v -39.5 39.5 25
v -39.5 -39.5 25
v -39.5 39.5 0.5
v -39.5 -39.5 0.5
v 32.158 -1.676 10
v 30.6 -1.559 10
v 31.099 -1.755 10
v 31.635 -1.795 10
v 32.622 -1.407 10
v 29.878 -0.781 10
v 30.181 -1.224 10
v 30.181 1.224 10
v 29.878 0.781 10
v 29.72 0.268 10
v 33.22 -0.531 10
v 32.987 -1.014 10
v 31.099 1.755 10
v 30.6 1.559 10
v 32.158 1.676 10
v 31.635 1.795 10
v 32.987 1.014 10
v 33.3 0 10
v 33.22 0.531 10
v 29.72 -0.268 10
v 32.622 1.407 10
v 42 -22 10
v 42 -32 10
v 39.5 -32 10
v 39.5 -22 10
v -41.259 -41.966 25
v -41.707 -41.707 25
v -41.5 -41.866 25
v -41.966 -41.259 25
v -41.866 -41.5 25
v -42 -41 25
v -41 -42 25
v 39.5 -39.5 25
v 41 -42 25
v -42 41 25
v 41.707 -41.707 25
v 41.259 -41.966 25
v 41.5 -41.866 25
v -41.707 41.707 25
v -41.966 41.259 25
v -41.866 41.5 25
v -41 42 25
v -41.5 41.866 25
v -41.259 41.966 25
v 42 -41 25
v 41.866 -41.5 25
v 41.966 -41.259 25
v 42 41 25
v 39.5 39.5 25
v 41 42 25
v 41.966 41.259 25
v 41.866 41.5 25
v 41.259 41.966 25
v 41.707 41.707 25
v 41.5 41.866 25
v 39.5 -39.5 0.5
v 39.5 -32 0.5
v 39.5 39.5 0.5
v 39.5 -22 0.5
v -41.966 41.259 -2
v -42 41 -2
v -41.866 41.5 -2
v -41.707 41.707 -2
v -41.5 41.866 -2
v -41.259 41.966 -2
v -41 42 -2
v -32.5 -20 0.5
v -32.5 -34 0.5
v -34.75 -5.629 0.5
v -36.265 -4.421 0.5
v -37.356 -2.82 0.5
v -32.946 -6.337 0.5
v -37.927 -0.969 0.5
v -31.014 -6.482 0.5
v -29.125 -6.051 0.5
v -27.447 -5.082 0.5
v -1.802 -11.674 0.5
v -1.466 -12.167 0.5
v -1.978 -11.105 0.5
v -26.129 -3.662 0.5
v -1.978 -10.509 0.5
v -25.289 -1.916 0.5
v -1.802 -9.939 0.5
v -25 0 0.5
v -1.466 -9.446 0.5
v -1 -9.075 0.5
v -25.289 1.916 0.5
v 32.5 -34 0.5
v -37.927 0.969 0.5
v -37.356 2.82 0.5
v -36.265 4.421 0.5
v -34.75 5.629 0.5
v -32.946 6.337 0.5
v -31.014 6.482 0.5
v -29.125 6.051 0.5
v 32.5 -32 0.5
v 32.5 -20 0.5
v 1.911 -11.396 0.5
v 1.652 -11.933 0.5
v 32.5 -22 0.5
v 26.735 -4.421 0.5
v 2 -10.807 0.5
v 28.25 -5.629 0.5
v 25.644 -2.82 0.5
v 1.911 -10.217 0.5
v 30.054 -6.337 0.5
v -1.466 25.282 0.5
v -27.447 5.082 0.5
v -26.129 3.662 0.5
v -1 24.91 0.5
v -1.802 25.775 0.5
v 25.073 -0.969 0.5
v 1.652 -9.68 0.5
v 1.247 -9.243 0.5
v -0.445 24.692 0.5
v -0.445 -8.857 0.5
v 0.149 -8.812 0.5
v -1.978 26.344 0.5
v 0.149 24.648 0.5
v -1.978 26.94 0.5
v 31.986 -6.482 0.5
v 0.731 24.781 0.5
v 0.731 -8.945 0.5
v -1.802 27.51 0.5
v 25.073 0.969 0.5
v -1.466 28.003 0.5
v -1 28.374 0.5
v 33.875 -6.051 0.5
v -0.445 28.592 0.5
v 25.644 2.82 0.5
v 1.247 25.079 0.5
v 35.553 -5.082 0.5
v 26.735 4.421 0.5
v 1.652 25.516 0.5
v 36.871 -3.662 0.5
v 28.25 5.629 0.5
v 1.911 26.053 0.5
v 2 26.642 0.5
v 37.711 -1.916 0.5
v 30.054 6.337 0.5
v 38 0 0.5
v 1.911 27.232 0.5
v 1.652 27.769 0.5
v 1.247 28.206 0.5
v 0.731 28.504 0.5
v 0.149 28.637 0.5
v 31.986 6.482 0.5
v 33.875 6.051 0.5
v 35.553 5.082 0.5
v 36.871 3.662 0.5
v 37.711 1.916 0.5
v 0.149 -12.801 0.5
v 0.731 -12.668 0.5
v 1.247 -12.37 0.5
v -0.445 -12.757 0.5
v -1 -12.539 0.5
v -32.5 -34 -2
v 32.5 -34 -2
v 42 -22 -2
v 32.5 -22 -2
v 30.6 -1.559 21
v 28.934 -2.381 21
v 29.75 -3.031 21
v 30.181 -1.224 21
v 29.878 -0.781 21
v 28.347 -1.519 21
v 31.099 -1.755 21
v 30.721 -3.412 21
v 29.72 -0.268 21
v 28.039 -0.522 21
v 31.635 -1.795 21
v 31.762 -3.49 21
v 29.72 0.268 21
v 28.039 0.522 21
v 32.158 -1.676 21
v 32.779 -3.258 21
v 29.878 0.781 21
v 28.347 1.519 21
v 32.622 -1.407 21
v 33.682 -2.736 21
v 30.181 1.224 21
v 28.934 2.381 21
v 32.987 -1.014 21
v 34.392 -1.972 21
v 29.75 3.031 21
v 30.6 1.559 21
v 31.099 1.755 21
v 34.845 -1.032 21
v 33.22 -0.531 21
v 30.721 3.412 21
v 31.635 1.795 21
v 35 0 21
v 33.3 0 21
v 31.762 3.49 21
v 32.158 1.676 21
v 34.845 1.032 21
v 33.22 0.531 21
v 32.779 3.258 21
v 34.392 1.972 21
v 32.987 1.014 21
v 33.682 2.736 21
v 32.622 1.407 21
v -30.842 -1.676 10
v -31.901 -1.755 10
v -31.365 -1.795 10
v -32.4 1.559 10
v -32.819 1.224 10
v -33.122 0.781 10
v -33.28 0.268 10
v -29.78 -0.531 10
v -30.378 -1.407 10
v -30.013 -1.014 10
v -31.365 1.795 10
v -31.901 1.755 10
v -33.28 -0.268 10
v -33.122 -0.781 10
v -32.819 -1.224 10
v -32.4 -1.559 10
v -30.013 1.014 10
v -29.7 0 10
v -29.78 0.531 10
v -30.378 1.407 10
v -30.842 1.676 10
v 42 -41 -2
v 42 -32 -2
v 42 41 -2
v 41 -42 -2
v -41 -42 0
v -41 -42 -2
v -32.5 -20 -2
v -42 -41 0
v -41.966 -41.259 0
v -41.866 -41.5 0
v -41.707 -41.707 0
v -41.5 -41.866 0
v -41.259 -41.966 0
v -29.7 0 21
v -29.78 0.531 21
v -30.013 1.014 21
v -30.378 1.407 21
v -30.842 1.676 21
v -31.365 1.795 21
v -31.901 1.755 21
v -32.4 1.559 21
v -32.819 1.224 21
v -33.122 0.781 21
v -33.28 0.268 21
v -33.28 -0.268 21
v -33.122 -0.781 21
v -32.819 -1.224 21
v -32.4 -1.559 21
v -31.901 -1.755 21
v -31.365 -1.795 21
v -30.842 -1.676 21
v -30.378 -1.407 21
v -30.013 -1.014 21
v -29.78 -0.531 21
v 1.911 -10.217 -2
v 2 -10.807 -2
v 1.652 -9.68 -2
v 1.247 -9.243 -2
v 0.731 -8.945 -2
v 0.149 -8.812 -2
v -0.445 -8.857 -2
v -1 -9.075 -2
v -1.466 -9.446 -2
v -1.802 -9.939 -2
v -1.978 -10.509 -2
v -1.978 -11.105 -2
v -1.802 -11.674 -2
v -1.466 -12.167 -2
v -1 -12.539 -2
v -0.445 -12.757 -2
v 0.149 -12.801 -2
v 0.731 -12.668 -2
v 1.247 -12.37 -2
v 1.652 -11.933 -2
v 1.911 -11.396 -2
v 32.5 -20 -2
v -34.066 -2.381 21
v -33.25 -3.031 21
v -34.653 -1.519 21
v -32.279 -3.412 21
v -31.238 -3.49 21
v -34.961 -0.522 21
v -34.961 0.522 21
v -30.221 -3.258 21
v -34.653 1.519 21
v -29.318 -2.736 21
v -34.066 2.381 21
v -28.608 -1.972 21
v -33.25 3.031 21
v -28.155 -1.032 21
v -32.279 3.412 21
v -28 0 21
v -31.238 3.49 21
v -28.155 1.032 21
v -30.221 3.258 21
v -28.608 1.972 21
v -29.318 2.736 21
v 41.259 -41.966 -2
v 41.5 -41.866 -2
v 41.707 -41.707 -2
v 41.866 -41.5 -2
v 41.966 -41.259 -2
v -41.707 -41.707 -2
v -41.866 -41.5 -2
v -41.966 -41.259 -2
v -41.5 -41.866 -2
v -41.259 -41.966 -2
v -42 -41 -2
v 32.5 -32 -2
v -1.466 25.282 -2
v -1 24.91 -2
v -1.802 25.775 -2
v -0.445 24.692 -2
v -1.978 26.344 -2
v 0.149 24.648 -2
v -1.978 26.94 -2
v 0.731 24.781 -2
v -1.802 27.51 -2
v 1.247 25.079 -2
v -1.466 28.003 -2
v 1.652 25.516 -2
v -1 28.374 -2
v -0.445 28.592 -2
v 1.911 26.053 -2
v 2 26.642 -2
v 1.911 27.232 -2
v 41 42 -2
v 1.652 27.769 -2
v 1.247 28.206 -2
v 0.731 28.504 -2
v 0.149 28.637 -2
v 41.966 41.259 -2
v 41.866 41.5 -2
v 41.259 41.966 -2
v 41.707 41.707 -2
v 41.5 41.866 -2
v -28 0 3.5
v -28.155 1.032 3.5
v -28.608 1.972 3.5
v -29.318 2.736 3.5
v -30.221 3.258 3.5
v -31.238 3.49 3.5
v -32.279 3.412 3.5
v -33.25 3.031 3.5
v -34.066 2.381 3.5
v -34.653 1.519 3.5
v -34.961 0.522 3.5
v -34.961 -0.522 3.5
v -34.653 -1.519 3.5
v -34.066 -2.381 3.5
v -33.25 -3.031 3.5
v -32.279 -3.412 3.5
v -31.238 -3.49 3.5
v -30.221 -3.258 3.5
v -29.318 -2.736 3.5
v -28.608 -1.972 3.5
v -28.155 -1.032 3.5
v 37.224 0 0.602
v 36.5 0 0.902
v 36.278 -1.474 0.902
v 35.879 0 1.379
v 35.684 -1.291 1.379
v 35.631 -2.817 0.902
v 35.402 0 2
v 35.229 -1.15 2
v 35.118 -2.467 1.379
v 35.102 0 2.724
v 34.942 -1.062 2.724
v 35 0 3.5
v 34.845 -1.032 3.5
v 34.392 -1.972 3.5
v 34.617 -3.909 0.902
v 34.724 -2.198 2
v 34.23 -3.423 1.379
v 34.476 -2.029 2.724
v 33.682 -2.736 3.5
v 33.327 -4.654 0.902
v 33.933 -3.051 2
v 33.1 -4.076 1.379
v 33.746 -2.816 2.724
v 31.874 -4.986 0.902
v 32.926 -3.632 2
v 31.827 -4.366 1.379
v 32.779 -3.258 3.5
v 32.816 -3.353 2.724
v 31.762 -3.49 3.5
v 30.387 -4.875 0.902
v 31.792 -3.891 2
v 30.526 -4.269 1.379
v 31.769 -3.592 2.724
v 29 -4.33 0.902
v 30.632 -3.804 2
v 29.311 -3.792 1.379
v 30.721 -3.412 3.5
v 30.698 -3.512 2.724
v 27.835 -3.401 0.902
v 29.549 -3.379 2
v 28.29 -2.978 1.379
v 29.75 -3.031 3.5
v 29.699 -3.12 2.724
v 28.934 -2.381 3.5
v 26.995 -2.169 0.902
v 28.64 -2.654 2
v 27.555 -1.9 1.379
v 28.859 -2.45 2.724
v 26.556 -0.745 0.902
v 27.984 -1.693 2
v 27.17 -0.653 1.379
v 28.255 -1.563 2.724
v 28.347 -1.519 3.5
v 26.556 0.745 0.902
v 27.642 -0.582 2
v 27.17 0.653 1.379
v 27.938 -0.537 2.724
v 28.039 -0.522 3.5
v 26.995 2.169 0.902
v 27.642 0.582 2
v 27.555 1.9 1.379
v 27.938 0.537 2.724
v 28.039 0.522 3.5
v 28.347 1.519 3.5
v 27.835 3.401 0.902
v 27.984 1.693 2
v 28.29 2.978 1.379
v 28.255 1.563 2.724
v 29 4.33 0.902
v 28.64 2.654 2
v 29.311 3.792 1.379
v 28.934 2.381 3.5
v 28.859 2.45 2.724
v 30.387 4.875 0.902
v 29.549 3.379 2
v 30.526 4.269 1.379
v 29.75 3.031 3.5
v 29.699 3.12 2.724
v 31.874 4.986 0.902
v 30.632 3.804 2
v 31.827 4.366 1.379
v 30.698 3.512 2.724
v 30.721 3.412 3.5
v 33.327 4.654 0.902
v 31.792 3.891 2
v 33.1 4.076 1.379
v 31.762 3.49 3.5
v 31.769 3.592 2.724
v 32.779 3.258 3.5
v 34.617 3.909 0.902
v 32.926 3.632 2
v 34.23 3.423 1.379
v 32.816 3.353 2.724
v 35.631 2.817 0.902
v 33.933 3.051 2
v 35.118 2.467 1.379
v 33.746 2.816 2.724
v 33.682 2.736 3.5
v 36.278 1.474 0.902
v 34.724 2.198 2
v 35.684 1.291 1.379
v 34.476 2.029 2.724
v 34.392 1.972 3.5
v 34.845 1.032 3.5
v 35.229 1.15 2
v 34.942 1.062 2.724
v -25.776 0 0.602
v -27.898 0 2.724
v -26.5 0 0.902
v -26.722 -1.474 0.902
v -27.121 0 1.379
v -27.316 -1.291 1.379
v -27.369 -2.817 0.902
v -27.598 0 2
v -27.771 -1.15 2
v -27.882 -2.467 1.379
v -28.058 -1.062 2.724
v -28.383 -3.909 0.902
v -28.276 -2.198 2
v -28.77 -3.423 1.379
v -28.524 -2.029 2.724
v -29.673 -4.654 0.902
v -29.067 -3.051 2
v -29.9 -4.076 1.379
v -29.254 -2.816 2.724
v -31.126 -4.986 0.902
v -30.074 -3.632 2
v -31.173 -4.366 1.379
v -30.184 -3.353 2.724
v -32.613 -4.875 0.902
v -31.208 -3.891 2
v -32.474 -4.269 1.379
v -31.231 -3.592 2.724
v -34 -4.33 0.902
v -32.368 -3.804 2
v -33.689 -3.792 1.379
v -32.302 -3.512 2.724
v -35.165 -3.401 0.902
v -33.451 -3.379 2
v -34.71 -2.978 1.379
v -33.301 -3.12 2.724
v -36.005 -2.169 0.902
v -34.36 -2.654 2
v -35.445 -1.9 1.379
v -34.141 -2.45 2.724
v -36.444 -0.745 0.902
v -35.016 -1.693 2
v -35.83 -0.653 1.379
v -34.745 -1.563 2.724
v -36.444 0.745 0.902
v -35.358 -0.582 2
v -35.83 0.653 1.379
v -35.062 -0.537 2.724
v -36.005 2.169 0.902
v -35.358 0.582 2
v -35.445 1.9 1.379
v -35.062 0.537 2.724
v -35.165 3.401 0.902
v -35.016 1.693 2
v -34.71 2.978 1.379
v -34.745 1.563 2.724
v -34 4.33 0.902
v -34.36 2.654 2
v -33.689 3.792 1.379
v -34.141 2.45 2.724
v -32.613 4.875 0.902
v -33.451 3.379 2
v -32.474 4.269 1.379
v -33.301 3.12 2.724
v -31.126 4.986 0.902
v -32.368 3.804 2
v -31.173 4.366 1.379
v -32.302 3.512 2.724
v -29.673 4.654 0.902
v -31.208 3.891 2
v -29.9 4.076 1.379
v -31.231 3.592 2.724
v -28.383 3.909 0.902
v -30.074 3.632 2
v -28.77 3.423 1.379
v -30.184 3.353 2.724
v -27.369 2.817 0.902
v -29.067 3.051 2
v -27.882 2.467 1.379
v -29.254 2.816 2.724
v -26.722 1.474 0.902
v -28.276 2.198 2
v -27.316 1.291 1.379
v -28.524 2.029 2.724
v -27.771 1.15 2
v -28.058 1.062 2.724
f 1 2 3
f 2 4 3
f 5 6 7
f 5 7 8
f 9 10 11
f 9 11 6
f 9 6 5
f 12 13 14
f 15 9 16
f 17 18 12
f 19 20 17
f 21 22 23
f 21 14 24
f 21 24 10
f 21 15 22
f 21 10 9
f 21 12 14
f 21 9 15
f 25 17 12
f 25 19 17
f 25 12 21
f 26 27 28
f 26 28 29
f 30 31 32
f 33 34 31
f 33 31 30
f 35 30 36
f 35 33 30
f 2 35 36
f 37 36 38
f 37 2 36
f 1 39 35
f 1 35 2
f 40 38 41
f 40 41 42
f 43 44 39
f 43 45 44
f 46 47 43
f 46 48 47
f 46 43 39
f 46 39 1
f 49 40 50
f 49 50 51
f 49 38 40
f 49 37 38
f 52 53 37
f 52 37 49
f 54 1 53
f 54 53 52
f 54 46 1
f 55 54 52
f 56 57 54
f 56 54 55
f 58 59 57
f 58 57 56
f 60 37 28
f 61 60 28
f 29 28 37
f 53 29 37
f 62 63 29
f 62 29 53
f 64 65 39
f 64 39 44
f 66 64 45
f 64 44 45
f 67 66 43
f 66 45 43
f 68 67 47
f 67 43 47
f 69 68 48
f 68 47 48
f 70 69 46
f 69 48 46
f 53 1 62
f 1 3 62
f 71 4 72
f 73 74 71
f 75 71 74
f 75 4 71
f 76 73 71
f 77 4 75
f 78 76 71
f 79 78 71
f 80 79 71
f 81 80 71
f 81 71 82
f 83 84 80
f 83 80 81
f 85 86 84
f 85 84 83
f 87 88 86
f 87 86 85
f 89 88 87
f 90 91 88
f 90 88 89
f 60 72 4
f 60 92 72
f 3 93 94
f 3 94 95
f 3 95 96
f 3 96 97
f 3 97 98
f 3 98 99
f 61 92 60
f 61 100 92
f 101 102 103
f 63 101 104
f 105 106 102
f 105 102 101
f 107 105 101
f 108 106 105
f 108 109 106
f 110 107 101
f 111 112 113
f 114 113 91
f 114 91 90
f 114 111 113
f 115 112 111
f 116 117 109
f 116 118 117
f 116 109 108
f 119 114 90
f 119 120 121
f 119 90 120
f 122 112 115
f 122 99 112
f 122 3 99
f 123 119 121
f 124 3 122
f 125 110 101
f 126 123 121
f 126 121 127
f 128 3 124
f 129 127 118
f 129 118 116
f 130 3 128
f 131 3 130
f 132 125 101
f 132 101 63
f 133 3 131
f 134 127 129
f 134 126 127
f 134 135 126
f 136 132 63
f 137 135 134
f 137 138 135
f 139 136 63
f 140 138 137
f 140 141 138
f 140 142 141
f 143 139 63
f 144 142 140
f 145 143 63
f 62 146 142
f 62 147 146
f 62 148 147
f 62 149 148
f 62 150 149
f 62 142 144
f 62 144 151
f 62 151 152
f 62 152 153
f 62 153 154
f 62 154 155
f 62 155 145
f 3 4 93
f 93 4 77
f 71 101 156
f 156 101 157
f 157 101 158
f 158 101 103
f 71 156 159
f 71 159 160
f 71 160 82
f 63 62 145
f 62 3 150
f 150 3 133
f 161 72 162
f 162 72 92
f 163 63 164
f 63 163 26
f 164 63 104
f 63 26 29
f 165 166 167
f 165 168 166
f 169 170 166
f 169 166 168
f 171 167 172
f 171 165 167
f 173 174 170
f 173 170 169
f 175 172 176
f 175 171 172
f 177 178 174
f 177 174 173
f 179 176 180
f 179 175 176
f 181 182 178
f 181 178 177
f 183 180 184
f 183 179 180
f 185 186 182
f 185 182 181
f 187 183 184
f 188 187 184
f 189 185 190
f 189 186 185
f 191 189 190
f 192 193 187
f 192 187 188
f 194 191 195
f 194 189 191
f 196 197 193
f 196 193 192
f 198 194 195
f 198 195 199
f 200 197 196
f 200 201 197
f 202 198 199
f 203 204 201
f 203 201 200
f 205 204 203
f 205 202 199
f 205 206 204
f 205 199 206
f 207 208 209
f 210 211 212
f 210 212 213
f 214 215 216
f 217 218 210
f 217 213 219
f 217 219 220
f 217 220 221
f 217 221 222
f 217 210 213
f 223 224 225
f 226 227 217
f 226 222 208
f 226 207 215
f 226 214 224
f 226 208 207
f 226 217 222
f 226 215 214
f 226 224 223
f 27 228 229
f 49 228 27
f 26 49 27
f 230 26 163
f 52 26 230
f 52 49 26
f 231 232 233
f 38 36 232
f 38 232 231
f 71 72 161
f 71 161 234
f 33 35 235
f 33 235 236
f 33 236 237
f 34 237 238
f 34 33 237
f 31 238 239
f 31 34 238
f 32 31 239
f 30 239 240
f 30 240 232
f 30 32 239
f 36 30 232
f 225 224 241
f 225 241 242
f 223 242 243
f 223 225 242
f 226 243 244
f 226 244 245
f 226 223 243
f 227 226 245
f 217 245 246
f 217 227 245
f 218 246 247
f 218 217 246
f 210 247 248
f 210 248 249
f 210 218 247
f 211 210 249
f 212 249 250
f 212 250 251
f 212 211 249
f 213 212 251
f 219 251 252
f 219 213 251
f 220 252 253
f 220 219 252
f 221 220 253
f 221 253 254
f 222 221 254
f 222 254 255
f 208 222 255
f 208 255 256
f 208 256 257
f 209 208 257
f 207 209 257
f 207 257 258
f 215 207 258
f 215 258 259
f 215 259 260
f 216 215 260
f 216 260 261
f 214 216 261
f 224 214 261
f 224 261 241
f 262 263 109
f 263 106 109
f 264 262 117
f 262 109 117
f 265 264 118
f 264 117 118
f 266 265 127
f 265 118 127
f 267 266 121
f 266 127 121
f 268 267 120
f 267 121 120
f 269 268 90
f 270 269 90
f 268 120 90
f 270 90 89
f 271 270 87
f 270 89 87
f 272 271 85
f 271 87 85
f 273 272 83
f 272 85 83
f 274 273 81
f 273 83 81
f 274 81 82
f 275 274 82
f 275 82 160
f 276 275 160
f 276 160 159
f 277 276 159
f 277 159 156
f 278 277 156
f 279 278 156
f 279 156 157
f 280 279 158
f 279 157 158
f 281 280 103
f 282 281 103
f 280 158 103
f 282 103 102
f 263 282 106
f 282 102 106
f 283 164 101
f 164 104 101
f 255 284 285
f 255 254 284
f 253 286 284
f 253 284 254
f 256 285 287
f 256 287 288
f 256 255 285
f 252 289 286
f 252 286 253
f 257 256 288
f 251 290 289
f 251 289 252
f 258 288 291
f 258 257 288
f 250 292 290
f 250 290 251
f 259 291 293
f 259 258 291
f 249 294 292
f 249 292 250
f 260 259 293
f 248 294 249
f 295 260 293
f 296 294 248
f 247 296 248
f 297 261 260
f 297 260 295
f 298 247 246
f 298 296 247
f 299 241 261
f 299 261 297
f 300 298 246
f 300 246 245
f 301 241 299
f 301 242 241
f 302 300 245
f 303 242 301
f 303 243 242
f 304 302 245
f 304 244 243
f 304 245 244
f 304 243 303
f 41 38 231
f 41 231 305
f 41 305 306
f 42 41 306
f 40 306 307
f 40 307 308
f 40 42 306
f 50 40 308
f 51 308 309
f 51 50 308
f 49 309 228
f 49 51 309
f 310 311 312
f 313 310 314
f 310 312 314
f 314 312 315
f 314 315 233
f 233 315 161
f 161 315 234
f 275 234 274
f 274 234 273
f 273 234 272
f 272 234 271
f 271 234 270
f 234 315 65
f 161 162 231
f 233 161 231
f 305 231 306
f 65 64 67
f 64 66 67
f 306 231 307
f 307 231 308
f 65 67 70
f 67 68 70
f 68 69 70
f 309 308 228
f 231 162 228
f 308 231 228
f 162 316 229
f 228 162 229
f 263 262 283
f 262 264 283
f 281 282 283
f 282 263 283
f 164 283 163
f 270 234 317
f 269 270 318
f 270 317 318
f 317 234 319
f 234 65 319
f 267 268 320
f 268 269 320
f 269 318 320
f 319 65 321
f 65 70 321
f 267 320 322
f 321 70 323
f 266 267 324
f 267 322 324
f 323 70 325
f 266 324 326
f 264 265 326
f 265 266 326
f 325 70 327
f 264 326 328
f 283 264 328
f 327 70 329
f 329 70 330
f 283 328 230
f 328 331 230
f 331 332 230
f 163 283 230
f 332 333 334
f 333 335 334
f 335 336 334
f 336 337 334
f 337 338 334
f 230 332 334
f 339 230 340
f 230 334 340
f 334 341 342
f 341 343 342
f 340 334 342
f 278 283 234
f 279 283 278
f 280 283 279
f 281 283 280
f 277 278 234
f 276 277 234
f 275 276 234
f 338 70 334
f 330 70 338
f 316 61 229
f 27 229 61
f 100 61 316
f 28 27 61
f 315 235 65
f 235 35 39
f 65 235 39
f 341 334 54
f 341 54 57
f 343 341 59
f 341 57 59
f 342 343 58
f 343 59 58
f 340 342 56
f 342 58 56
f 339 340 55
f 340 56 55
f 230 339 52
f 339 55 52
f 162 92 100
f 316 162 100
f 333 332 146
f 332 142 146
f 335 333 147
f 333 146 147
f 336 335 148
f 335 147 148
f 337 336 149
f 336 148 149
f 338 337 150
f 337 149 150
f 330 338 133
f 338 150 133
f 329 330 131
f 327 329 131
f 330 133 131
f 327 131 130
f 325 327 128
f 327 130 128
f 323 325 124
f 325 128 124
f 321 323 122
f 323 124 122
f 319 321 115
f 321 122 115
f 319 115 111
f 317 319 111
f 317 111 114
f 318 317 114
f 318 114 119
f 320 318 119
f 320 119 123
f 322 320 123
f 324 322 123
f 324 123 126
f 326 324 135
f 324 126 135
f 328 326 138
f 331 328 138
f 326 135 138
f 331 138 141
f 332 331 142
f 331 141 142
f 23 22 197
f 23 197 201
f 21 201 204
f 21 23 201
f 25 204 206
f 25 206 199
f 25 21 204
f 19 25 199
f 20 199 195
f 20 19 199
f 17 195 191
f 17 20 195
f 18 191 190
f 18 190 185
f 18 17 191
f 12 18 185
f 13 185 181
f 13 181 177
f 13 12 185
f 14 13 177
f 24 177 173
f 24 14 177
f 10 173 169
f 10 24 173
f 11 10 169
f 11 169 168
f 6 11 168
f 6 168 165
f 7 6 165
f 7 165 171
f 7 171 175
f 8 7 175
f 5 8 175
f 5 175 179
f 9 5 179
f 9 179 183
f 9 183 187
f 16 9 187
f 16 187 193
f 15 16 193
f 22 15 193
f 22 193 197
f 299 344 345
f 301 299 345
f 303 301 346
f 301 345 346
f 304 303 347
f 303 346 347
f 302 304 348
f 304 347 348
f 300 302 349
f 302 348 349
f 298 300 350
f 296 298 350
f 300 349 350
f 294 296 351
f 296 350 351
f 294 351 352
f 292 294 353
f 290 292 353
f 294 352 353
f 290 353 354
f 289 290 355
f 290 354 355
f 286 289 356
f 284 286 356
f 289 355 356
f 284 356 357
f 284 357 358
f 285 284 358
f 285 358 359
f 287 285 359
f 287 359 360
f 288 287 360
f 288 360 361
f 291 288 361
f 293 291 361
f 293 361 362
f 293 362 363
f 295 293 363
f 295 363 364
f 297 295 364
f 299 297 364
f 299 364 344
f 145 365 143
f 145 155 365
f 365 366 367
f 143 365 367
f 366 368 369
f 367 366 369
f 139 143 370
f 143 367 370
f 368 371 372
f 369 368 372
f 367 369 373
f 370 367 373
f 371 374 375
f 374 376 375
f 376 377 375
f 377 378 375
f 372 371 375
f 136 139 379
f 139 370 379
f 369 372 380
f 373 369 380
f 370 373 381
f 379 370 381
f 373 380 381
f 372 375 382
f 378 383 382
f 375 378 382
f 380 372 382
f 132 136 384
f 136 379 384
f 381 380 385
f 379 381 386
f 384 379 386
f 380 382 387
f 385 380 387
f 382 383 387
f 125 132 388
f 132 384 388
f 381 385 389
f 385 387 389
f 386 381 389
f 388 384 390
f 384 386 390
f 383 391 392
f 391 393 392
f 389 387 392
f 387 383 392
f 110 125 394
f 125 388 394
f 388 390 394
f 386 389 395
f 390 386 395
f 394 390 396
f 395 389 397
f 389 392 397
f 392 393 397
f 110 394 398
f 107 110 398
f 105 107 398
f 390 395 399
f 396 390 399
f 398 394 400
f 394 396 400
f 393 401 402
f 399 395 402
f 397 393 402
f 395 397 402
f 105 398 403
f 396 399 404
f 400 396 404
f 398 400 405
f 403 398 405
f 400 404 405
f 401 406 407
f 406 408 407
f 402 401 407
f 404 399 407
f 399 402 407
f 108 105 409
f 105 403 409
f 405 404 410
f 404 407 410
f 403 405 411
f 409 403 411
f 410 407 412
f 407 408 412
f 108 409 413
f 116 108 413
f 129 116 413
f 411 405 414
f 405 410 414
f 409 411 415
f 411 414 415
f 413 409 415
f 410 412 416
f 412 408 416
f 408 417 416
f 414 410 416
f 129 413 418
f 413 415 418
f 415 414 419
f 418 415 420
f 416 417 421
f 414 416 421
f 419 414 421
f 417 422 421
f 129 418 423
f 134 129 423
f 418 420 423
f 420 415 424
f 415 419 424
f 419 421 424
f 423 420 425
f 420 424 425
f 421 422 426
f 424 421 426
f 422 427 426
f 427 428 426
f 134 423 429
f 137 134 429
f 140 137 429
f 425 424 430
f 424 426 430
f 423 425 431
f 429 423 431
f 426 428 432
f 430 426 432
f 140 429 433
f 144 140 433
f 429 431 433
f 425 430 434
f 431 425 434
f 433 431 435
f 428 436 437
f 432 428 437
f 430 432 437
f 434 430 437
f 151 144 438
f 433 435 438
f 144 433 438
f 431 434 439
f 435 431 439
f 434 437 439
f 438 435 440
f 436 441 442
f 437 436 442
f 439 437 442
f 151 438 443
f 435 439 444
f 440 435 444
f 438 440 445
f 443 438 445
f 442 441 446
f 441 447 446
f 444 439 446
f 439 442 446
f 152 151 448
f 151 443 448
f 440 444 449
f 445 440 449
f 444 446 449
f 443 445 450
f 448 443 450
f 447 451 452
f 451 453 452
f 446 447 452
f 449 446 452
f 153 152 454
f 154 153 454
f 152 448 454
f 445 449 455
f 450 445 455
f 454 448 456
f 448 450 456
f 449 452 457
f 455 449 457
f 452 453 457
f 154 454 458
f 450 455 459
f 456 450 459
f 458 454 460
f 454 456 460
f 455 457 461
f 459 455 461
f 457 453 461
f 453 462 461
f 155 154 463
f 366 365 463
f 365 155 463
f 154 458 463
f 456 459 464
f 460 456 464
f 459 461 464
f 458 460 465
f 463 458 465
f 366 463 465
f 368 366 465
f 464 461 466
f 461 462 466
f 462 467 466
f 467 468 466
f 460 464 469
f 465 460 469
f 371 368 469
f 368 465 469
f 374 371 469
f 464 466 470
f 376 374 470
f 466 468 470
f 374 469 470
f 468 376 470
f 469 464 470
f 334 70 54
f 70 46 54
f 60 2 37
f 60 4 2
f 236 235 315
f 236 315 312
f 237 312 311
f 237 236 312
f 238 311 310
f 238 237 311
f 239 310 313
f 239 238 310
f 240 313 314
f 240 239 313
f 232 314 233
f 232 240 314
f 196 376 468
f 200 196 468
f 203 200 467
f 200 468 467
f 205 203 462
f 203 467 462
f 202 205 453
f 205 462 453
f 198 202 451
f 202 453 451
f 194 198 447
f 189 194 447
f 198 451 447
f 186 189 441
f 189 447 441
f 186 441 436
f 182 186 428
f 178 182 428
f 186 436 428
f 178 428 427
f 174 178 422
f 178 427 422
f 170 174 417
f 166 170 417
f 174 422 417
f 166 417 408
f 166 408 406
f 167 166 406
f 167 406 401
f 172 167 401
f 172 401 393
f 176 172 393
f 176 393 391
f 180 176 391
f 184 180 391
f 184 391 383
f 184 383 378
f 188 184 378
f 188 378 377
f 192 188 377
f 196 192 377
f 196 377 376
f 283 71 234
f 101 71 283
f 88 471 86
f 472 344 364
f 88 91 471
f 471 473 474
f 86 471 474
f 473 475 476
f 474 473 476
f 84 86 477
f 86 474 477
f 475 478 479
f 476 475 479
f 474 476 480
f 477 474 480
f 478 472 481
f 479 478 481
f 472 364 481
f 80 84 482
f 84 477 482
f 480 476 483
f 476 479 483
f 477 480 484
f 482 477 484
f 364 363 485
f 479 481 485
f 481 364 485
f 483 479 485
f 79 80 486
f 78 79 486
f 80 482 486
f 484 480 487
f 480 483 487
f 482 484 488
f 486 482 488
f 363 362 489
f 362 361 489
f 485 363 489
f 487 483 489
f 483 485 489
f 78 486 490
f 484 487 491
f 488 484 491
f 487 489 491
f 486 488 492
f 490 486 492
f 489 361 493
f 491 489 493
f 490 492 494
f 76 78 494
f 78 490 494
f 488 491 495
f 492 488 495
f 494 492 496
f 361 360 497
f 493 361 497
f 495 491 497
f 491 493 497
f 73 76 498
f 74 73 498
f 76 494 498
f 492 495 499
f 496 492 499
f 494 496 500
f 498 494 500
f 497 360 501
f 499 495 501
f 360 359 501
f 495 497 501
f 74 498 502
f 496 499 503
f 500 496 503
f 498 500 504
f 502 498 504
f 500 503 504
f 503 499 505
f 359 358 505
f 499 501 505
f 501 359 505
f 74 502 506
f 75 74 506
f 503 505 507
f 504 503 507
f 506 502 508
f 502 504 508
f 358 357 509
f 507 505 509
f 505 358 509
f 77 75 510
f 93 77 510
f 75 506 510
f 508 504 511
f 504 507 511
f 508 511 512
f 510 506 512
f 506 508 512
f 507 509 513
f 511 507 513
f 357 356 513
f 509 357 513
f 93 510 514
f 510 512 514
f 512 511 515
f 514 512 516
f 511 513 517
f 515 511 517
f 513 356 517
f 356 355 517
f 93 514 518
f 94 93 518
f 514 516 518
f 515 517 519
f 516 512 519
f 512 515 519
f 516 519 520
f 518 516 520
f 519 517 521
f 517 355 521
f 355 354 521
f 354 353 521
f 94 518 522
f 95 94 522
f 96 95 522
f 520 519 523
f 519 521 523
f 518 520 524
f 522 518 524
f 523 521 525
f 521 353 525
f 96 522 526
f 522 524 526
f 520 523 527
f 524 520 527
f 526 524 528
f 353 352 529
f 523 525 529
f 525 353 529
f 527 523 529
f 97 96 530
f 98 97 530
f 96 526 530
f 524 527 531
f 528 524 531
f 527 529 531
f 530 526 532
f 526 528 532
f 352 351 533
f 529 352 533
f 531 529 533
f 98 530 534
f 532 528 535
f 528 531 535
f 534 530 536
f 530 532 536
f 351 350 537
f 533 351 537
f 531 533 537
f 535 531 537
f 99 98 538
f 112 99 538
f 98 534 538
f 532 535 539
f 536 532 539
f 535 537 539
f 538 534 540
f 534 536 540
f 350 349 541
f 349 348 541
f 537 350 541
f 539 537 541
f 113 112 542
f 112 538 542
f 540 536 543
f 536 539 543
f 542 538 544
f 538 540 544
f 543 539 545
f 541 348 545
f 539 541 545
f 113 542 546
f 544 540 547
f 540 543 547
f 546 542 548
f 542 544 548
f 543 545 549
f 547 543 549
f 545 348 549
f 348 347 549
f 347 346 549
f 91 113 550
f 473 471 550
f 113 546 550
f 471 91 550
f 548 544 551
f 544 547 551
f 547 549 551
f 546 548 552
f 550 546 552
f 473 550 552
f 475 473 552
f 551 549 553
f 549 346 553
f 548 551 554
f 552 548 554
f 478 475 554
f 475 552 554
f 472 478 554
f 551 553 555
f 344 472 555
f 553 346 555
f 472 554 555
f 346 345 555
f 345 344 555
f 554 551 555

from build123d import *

# Parameters (mm, degrees)
F0_W      = 84
F0_H      = 84
F1_DEPTH  = 27
F2_T      = -2.5
F3_DEPTH  = 2
F4_W      = 65
F4_H      = 14
F5_DEPTH  = 25
F6_W      = 10
F6_H      = 10
F7_DEPTH  = 21.8
F4_R      = 2
F8_DEPTH  = 25
F9_DEPTH  = 2
F10_R     = 3.5
F10_R_2   = 1.8
F11_DEPTH = 21
F12_DEPTH = 10
F13_R     = 1
F14_DEPTH = 2
F15_R     = 3


# Not quite as in the source:
# - a feature names something its author has since deleted; it is built from what else it names


with BuildPart() as f1:
    # F0 (on Top) → F1 (new body)
    with BuildSketch(Plane.XY):
        Rectangle(F0_W, F0_H)
    extrude(amount=F1_DEPTH)

    # F2
    f2_openings = [f1.faces().sort_by_distance(p)[0] for p in [
        (0, 0, 27),
    ]]
    offset(amount=F2_T, openings=f2_openings)

    # F3 (cut): a face of the model
    f3_faces = [f1.faces().sort_by_distance(p)[0] for p in [
        (0, 0, 2.5),
    ]]
    extrude(f3_faces, amount=F3_DEPTH, mode=Mode.SUBTRACT)

    # F4 (on face) → F5 (cut)
    with BuildSketch(Plane.XY.offset(2.5)):
        with Locations((0, -27)):
            Rectangle(F4_W, F4_H)
    extrude(amount=-F5_DEPTH, mode=Mode.SUBTRACT)

    # F6 (on face) → F7 (cut)
    with BuildSketch(Plane.YZ.offset(42)):
        with Locations((-27, 5)):
            Rectangle(F6_W, F6_H)
    extrude(amount=-F7_DEPTH, mode=Mode.SUBTRACT)

    # F4 (on face) → F8 (cut)
    with BuildSketch(Plane.XY.offset(2.5)):
        with Locations((0, 26.6423244029)):
            Circle(F4_R)
        with Locations((0, -10.8067262918)):
            Circle(F4_R)
    extrude(amount=-F8_DEPTH, mode=Mode.SUBTRACT)

    # F9 (cut): faces of the model
    f9_faces = [f1.faces().sort_by_distance(p)[0] for p in [
        (0, 40.8120606076, 27),
        (-0.4812956241, 5.0155977429, 2.5),
    ]]
    extrude(f9_faces, amount=-F9_DEPTH, mode=Mode.SUBTRACT)

    # F10 (on Top) → F11 (join)
    with BuildSketch(Plane.XY):
        with Locations((-31.5, 0)):
            Circle(F10_R)
        with Locations((-31.5, 0)):
            Circle(F10_R_2, mode=Mode.SUBTRACT)
        with Locations((31.5, 0)):
            Circle(F10_R)
        with Locations((31.5, 0)):
            Circle(F10_R_2, mode=Mode.SUBTRACT)
    extrude(amount=F11_DEPTH)

    # F10 (on Top) → F12 (join)
    with BuildSketch(Plane.XY):
        with Locations((-31.5, 0)):
            Circle(F10_R_2)
        with Locations((31.5, 0)):
            Circle(F10_R_2)
    extrude(amount=F12_DEPTH)

    # F13
    f13_edges = [f1.edges().sort_by_distance(p)[0] for p in [
        (-42, 42, 12.5),
        (42, 42, 12.5),
        (42, -42, 12.5),
        (-42, -42, 12.5),
    ]]
    fillet(f13_edges, radius=F13_R)

    # F14 (add): a face of the model
    f14_faces = [f1.faces().sort_by_distance(p)[0] for p in [
        (-0.5873435355, 4.470699491, 0),
    ]]
    extrude(f14_faces, amount=F14_DEPTH)

    # F15
    f15_edges = [f1.edges().sort_by_distance(p)[0] for p in [
        (-35, 0, 0.5),
        (28, 0, 0.5),
    ]]
    fillet(f15_edges, radius=F15_R)


solid = f1.part
